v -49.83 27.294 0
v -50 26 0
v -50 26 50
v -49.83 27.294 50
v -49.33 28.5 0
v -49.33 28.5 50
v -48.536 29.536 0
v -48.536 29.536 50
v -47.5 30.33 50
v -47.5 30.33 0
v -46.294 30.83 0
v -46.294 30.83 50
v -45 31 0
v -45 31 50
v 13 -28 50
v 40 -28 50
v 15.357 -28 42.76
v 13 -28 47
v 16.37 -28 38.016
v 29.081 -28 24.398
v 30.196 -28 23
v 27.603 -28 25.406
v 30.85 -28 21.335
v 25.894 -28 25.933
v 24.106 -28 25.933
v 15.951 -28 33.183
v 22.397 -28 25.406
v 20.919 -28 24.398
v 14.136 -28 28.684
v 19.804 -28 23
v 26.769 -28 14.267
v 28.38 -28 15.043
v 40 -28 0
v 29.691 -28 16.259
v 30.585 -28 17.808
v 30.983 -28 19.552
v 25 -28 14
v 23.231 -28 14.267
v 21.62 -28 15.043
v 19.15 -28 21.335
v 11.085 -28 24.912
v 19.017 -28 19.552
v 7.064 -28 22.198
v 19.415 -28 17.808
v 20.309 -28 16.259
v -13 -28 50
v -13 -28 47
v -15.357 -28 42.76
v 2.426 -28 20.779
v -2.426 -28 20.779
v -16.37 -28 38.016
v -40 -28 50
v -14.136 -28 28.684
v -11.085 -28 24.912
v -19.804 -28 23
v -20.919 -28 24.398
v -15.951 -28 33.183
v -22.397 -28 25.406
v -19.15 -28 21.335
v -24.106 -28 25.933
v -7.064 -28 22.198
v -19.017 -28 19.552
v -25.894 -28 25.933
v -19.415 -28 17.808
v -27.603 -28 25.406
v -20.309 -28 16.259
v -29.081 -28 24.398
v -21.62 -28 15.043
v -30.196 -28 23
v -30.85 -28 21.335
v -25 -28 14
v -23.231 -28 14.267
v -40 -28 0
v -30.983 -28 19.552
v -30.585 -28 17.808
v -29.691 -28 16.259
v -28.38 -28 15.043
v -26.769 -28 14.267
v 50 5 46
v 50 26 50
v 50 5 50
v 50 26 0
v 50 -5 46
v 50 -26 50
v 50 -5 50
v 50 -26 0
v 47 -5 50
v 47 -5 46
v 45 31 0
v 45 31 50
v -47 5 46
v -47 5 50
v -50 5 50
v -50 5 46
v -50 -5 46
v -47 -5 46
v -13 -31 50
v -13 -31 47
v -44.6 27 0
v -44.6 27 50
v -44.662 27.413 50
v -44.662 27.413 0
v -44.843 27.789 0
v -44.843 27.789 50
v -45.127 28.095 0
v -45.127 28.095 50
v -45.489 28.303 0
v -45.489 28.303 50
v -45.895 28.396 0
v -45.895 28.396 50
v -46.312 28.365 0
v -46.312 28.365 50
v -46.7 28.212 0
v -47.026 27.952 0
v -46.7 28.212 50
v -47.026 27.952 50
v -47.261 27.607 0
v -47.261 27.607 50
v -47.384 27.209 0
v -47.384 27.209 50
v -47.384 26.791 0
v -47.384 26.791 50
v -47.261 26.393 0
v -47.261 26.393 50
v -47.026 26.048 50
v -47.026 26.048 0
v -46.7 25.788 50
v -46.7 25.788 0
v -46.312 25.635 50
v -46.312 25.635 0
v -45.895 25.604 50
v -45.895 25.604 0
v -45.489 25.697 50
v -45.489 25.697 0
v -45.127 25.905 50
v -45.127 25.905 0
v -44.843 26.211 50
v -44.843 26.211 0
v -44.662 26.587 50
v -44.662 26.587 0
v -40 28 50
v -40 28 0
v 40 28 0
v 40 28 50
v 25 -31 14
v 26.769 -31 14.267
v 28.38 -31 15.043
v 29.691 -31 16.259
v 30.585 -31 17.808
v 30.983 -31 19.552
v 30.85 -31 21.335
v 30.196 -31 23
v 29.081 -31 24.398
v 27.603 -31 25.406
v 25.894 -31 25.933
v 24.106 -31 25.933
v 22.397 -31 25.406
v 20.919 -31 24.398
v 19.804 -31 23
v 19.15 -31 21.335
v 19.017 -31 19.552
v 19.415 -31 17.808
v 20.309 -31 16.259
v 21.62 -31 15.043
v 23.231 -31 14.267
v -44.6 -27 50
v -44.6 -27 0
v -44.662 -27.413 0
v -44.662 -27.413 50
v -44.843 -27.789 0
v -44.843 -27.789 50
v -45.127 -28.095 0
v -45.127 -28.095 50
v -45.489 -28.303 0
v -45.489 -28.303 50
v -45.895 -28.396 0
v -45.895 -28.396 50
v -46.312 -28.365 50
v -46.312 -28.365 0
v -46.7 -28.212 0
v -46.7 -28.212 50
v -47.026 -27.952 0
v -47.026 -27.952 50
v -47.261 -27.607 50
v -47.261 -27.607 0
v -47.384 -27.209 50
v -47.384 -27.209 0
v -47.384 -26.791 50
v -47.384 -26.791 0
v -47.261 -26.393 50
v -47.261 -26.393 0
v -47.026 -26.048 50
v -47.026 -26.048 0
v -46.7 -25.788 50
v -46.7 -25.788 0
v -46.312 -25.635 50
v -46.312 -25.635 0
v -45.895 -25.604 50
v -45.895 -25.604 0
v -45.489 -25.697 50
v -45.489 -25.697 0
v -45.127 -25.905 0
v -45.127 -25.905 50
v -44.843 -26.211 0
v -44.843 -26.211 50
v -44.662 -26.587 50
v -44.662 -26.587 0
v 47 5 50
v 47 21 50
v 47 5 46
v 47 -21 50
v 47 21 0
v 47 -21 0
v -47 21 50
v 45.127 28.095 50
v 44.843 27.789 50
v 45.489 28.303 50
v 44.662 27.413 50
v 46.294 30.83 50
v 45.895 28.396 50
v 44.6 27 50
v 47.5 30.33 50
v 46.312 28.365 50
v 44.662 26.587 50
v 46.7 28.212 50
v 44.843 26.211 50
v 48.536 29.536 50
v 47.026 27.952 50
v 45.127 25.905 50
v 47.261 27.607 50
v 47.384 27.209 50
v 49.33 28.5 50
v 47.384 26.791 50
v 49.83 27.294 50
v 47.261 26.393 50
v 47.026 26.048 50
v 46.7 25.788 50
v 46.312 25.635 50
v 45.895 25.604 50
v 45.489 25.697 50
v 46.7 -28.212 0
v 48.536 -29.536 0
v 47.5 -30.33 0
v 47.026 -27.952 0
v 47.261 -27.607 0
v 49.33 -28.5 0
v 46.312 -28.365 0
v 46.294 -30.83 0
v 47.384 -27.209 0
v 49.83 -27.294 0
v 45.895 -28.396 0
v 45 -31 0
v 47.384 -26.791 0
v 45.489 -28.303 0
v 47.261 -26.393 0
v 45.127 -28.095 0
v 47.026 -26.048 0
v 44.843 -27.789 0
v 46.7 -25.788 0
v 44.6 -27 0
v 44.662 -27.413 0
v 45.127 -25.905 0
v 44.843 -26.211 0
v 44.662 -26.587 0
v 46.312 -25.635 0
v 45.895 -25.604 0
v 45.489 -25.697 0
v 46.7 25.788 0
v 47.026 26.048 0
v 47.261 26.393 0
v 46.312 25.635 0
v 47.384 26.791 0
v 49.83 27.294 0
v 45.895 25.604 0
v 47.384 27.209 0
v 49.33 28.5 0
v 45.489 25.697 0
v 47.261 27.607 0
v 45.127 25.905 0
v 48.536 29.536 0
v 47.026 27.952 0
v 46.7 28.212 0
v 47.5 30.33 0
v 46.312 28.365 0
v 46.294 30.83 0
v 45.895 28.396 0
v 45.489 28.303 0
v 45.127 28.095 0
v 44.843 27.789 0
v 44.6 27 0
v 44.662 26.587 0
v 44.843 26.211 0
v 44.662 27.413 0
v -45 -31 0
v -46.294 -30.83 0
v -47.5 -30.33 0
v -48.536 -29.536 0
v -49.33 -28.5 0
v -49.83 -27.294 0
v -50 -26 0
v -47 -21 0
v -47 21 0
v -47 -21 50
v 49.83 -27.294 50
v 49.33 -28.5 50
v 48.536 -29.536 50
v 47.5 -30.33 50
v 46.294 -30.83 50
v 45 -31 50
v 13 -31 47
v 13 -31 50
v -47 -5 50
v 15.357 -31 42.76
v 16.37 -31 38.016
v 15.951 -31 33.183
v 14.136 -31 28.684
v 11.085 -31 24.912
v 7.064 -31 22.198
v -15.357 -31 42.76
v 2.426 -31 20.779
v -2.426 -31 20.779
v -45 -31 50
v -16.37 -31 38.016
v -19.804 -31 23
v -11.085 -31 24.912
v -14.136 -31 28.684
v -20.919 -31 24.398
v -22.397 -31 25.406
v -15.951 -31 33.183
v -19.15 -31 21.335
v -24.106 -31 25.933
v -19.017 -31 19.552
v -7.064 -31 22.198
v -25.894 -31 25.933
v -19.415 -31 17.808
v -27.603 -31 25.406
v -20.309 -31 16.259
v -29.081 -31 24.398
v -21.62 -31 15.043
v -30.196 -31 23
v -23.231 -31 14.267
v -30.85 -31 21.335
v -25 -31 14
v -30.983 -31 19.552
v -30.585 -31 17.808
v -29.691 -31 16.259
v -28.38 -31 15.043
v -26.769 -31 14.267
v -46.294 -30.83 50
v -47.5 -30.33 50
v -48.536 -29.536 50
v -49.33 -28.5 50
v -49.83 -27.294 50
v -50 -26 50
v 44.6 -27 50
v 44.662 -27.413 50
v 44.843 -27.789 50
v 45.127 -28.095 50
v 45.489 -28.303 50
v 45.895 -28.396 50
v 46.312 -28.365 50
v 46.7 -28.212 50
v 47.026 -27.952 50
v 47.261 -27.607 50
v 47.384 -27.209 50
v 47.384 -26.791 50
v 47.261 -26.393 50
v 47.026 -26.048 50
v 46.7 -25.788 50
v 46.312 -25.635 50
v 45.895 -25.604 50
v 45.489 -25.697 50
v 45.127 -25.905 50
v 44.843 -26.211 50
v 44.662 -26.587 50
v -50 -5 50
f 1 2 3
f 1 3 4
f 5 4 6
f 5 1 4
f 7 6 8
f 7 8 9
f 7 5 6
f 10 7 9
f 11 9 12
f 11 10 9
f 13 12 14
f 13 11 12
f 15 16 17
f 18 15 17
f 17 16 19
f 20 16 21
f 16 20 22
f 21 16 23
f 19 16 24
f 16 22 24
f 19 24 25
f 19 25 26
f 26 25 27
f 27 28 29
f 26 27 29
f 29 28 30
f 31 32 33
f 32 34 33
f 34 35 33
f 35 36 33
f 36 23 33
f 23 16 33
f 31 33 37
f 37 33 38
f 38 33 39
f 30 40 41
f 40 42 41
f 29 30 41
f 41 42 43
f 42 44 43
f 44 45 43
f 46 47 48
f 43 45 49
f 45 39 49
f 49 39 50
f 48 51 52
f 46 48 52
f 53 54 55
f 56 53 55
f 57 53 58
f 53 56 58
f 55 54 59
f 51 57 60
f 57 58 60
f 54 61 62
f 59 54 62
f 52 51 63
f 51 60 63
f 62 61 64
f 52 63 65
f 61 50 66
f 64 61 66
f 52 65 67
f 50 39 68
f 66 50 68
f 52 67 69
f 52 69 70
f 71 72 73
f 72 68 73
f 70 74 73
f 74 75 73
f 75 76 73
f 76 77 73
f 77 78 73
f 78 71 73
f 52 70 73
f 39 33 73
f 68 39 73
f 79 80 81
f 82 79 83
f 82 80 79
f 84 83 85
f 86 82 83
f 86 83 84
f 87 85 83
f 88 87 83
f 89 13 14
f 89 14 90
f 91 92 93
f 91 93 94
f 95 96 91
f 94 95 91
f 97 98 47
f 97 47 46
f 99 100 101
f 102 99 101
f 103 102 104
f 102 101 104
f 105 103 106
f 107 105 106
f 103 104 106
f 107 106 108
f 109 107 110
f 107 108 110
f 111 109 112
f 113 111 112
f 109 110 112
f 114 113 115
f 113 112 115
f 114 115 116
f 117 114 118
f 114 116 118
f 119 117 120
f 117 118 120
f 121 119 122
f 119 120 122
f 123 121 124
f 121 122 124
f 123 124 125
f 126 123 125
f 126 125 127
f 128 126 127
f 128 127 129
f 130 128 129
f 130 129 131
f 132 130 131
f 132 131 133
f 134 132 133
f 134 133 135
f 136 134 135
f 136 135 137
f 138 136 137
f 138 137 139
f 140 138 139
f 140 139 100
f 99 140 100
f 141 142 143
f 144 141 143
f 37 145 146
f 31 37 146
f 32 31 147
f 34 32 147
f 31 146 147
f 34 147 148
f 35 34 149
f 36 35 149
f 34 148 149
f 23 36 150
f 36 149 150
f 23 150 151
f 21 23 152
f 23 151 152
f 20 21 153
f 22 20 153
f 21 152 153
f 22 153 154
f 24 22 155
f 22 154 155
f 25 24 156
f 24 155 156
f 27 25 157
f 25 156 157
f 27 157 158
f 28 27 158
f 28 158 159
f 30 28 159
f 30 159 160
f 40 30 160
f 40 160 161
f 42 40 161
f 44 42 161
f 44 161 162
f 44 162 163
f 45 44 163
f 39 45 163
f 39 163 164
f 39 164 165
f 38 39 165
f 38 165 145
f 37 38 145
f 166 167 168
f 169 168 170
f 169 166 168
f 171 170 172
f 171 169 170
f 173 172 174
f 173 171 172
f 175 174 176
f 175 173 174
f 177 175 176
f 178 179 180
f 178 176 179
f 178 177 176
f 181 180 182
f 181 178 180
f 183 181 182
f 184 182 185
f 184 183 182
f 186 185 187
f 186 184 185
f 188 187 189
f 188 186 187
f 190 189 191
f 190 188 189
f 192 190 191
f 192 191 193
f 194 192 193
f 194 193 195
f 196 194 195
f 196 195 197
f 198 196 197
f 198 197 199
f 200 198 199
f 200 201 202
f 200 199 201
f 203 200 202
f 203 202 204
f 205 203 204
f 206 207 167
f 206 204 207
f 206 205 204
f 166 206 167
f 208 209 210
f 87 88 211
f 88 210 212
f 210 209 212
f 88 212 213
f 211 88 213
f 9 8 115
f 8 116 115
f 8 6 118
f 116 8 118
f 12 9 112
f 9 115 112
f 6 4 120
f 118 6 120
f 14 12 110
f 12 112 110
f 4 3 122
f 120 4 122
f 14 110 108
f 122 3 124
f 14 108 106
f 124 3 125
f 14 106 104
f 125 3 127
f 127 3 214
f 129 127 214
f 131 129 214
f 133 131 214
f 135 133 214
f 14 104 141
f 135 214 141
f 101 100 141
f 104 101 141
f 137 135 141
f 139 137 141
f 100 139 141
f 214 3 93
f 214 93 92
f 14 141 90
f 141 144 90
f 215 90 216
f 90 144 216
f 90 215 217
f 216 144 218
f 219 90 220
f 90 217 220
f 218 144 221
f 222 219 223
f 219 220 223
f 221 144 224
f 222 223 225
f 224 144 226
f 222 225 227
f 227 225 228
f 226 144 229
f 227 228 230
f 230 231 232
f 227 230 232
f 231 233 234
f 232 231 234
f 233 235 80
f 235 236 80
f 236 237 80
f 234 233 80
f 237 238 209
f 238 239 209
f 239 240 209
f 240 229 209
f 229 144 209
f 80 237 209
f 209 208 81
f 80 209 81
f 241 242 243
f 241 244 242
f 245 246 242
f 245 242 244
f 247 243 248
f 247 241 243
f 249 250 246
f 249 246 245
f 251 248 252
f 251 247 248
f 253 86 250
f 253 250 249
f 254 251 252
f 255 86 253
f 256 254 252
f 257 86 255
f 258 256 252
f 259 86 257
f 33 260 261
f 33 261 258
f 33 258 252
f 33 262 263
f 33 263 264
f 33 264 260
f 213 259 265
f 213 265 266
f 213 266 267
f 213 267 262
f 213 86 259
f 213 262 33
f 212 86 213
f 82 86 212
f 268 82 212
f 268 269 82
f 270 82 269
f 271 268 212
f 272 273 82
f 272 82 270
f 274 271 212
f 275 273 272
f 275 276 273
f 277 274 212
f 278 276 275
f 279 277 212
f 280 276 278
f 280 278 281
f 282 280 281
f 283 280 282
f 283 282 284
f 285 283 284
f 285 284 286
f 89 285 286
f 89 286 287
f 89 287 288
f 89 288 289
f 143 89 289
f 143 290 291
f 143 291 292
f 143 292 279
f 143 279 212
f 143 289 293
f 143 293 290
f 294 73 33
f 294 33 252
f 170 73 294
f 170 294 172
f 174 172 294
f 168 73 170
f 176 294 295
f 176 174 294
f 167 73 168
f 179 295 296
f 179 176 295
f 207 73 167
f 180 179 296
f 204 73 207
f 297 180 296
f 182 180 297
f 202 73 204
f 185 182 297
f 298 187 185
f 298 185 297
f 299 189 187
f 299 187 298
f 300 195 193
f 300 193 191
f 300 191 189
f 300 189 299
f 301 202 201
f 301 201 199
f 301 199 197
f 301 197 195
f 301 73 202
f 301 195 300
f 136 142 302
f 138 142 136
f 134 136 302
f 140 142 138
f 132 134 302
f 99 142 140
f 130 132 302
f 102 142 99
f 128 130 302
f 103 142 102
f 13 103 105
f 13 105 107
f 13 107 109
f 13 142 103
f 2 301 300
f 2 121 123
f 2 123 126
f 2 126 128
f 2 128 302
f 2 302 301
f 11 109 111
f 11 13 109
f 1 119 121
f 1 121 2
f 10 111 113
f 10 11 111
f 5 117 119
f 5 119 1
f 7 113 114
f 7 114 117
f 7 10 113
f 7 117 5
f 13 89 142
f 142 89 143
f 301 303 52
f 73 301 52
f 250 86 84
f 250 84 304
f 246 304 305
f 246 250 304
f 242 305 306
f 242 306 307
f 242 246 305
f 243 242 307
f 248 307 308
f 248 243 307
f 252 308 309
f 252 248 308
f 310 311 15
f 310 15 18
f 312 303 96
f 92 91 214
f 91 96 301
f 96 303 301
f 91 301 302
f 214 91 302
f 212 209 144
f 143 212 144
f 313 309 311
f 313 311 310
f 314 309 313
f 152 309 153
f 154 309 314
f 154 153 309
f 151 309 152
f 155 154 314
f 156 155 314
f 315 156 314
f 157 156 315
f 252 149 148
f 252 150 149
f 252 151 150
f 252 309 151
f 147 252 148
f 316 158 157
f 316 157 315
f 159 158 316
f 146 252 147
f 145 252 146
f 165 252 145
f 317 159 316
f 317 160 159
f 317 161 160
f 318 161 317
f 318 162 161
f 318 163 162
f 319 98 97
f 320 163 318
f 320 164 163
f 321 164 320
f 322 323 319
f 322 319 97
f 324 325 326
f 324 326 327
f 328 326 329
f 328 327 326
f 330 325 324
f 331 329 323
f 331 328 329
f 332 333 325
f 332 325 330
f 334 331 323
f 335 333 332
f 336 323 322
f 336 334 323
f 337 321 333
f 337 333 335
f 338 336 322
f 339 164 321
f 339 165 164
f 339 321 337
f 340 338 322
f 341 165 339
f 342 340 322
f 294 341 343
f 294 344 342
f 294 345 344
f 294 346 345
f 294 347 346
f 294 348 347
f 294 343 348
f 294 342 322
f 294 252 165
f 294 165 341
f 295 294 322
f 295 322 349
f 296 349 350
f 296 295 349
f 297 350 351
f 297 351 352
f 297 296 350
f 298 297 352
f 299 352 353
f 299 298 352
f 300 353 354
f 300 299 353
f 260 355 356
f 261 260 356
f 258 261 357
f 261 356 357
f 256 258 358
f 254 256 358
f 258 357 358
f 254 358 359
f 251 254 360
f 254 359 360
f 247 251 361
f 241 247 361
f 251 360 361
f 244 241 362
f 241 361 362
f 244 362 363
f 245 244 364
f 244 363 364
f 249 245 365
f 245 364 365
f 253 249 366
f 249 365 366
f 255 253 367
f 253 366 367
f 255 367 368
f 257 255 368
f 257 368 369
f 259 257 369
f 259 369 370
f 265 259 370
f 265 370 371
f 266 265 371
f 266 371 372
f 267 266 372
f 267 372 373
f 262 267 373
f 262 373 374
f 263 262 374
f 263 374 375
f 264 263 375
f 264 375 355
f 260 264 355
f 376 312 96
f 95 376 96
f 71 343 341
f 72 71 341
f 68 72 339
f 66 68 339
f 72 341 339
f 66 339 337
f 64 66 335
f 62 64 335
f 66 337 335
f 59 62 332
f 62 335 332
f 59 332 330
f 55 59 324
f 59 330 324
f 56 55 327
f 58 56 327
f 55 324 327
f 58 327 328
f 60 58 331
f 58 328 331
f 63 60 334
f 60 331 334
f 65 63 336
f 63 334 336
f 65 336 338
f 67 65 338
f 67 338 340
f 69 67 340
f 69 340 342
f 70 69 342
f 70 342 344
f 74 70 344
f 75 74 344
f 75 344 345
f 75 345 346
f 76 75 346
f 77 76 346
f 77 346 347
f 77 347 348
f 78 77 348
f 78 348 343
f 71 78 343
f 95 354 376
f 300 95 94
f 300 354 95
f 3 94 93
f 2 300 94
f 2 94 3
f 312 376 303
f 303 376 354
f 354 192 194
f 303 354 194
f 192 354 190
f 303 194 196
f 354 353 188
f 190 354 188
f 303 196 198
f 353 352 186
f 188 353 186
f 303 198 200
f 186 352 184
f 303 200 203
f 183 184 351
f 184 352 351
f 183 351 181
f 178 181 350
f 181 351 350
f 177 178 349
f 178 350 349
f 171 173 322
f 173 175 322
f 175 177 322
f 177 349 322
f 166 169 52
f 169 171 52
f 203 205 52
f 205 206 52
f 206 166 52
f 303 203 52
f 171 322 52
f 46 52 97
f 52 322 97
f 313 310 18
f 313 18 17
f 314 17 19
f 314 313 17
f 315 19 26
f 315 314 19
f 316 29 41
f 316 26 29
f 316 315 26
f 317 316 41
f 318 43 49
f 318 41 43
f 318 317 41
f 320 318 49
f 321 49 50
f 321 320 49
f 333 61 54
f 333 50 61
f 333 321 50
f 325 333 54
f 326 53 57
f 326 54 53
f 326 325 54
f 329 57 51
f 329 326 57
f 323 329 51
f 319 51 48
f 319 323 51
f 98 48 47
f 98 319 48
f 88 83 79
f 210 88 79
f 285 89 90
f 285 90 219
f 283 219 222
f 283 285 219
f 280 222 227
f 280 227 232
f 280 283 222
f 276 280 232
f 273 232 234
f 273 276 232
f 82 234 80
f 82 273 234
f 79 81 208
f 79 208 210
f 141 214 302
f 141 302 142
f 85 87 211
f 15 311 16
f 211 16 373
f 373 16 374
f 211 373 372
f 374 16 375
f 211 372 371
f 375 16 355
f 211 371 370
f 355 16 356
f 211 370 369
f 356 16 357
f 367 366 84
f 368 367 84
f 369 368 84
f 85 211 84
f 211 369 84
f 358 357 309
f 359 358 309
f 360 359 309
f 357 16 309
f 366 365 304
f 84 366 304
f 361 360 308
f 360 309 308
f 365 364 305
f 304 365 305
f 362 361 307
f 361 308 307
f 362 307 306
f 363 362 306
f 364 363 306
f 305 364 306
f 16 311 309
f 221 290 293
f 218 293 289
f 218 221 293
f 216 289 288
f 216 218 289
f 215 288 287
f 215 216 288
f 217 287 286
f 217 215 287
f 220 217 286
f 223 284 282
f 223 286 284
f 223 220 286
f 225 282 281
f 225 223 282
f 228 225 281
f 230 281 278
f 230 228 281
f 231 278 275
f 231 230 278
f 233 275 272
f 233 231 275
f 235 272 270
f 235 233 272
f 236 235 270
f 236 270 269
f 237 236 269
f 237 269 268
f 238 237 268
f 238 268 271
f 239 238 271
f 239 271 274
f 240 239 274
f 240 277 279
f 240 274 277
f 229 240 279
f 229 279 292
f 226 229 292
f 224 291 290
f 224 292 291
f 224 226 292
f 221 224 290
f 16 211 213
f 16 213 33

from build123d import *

# Parameters (mm, degrees)
EXTRUDE_1_DEPTH          = 50
EXTRUDE_2_DEPTH          = 50
SKETCH_4_R               = 1.4
CUT_EXTRUDE_1_DEPTH      = 60
MIRROR_2_COPY_1_DEPTH    = 50
MIRROR_2_COPY_2_SKETCH_R = 1.4
MIRROR_2_COPY_2_DEPTH    = 60
CUT_EXTRUDE_2_DEPTH      = 10
SKETCH_7_R               = 6
CUT_EXTRUDE_3_DEPTH      = 10
SKETCH_8_W               = 4
SKETCH_8_H               = 10
CUT_EXTRUDE_4_DEPTH      = 100


with BuildPart() as part:
    # 草图1 → 凸台-拉伸1 (new body)
    with BuildSketch(Plane.XY):
        with BuildLine():
            Line((-45, 31), (45, 31))
            ThreePointArc((45, 31), (48.535533906, 29.535533906), (50, 26))
            Line((50, 26), (50, -26))
            ThreePointArc((50, -26), (48.535533906, -29.535533906), (45, -31))
            Line((45, -31), (-45, -31))
            ThreePointArc((-45, -31), (-48.535533906, -29.535533906), (-50, -26))
            Line((-50, -26), (-50, 26))
            ThreePointArc((-50, 26), (-48.535533906, 29.535533906), (-45, 31))
        make_face()
        with BuildLine():
            Line((-42, 28), (42, 28))
            ThreePointArc((42, 28), (45.535533906, 26.535533906), (47, 23))
            Line((47, 23), (47, -23))
            ThreePointArc((47, -23), (45.535533906, -26.535533906), (42, -28))
            Line((42, -28), (-42, -28))
            ThreePointArc((-42, -28), (-45.535533906, -26.535533906), (-47, -23))
            Line((-47, -23), (-47, 23))
            ThreePointArc((-47, 23), (-45.535533906, 26.535533906), (-42, 28))
        make_face(mode=Mode.SUBTRACT)
    extrude(amount=EXTRUDE_1_DEPTH)

    # 草图3 → 凸台-拉伸2 (add)
    with BuildSketch(Plane.XY.offset(50)):
        Polygon((-47, 28), (-47, 21), (-40, 28), align=None)
    extrude_2 = extrude(amount=-EXTRUDE_2_DEPTH)

    # 草图4 → 切除-拉伸1 (cut)
    with BuildSketch(Plane.XY.offset(50)):
        with Locations((-46, 27)):
            Circle(SKETCH_4_R)
    cut_extrude_1 = extrude(amount=-CUT_EXTRUDE_1_DEPTH, mode=Mode.SUBTRACT)

    # 镜向1: 凸台-拉伸2, 切除-拉伸1 across plane
    add(extrude_2.mirror(Plane(origin=(0, 0, 0), x_dir=(0, 0, 1), z_dir=(1, 0, 0))))
    add(cut_extrude_1.mirror(Plane(origin=(0, 0, 0), x_dir=(0, 0, 1), z_dir=(1, 0, 0))), mode=Mode.SUBTRACT)

    # 镜向2: 凸台-拉伸2, 切除-拉伸1 across plane
    add(extrude_2.mirror(Plane.ZX))
    add(cut_extrude_1.mirror(Plane.ZX), mode=Mode.SUBTRACT)

    # 镜向2 copy 1 sketch → 镜向2 copy 1 (add)
    with BuildSketch(Plane(origin=(0, 0, 50), x_dir=(-1, 0, 0), z_dir=(0, 0, 1))):
        Polygon((-47, 28), (-47, 21), (-40, 28), align=None)
    extrude(amount=-MIRROR_2_COPY_1_DEPTH)

    # 镜向2 copy 2 sketch → 镜向2 copy 2 (cut)
    with BuildSketch(Plane(origin=(0, 0, 50), x_dir=(-1, 0, 0), z_dir=(0, 0, 1))):
        with Locations((-46, 27)):
            Circle(MIRROR_2_COPY_2_SKETCH_R)
    extrude(amount=-MIRROR_2_COPY_2_DEPTH, mode=Mode.SUBTRACT)

    # 草图6 → 切除-拉伸2 (cut)
    with BuildSketch(Plane.XZ.offset(31)):
        with BuildLine():
            Line((-13, 50), (13, 50))
            Line((13, 50), (13, 47))
            ThreePointArc((13, 47), (0, 20.598780533), (-13, 47))
            Line((-13, 47), (-13, 50))
        make_face()
    extrude(amount=-CUT_EXTRUDE_2_DEPTH, mode=Mode.SUBTRACT)

    # 草图7 → 切除-拉伸3 (cut)
    with BuildSketch(Plane.XZ.offset(31)):
        with Locations(Location((-25, 20, 0), (0, 0, 270))):
            Circle(SKETCH_7_R)
        with Locations(Location((25, 20, 0), (0, 0, 270))):
            Circle(SKETCH_7_R)
    extrude(amount=-CUT_EXTRUDE_3_DEPTH, mode=Mode.SUBTRACT)

    # 草图8 → 切除-拉伸4 (cut)
    with BuildSketch(Plane(origin=(50, 0, 0), x_dir=(0, 0, -1), z_dir=(1, 0, 0))):
        with Locations((-48, 0)):
            Rectangle(SKETCH_8_W, SKETCH_8_H)
    extrude(amount=-CUT_EXTRUDE_4_DEPTH, mode=Mode.SUBTRACT)


solid = part.part
